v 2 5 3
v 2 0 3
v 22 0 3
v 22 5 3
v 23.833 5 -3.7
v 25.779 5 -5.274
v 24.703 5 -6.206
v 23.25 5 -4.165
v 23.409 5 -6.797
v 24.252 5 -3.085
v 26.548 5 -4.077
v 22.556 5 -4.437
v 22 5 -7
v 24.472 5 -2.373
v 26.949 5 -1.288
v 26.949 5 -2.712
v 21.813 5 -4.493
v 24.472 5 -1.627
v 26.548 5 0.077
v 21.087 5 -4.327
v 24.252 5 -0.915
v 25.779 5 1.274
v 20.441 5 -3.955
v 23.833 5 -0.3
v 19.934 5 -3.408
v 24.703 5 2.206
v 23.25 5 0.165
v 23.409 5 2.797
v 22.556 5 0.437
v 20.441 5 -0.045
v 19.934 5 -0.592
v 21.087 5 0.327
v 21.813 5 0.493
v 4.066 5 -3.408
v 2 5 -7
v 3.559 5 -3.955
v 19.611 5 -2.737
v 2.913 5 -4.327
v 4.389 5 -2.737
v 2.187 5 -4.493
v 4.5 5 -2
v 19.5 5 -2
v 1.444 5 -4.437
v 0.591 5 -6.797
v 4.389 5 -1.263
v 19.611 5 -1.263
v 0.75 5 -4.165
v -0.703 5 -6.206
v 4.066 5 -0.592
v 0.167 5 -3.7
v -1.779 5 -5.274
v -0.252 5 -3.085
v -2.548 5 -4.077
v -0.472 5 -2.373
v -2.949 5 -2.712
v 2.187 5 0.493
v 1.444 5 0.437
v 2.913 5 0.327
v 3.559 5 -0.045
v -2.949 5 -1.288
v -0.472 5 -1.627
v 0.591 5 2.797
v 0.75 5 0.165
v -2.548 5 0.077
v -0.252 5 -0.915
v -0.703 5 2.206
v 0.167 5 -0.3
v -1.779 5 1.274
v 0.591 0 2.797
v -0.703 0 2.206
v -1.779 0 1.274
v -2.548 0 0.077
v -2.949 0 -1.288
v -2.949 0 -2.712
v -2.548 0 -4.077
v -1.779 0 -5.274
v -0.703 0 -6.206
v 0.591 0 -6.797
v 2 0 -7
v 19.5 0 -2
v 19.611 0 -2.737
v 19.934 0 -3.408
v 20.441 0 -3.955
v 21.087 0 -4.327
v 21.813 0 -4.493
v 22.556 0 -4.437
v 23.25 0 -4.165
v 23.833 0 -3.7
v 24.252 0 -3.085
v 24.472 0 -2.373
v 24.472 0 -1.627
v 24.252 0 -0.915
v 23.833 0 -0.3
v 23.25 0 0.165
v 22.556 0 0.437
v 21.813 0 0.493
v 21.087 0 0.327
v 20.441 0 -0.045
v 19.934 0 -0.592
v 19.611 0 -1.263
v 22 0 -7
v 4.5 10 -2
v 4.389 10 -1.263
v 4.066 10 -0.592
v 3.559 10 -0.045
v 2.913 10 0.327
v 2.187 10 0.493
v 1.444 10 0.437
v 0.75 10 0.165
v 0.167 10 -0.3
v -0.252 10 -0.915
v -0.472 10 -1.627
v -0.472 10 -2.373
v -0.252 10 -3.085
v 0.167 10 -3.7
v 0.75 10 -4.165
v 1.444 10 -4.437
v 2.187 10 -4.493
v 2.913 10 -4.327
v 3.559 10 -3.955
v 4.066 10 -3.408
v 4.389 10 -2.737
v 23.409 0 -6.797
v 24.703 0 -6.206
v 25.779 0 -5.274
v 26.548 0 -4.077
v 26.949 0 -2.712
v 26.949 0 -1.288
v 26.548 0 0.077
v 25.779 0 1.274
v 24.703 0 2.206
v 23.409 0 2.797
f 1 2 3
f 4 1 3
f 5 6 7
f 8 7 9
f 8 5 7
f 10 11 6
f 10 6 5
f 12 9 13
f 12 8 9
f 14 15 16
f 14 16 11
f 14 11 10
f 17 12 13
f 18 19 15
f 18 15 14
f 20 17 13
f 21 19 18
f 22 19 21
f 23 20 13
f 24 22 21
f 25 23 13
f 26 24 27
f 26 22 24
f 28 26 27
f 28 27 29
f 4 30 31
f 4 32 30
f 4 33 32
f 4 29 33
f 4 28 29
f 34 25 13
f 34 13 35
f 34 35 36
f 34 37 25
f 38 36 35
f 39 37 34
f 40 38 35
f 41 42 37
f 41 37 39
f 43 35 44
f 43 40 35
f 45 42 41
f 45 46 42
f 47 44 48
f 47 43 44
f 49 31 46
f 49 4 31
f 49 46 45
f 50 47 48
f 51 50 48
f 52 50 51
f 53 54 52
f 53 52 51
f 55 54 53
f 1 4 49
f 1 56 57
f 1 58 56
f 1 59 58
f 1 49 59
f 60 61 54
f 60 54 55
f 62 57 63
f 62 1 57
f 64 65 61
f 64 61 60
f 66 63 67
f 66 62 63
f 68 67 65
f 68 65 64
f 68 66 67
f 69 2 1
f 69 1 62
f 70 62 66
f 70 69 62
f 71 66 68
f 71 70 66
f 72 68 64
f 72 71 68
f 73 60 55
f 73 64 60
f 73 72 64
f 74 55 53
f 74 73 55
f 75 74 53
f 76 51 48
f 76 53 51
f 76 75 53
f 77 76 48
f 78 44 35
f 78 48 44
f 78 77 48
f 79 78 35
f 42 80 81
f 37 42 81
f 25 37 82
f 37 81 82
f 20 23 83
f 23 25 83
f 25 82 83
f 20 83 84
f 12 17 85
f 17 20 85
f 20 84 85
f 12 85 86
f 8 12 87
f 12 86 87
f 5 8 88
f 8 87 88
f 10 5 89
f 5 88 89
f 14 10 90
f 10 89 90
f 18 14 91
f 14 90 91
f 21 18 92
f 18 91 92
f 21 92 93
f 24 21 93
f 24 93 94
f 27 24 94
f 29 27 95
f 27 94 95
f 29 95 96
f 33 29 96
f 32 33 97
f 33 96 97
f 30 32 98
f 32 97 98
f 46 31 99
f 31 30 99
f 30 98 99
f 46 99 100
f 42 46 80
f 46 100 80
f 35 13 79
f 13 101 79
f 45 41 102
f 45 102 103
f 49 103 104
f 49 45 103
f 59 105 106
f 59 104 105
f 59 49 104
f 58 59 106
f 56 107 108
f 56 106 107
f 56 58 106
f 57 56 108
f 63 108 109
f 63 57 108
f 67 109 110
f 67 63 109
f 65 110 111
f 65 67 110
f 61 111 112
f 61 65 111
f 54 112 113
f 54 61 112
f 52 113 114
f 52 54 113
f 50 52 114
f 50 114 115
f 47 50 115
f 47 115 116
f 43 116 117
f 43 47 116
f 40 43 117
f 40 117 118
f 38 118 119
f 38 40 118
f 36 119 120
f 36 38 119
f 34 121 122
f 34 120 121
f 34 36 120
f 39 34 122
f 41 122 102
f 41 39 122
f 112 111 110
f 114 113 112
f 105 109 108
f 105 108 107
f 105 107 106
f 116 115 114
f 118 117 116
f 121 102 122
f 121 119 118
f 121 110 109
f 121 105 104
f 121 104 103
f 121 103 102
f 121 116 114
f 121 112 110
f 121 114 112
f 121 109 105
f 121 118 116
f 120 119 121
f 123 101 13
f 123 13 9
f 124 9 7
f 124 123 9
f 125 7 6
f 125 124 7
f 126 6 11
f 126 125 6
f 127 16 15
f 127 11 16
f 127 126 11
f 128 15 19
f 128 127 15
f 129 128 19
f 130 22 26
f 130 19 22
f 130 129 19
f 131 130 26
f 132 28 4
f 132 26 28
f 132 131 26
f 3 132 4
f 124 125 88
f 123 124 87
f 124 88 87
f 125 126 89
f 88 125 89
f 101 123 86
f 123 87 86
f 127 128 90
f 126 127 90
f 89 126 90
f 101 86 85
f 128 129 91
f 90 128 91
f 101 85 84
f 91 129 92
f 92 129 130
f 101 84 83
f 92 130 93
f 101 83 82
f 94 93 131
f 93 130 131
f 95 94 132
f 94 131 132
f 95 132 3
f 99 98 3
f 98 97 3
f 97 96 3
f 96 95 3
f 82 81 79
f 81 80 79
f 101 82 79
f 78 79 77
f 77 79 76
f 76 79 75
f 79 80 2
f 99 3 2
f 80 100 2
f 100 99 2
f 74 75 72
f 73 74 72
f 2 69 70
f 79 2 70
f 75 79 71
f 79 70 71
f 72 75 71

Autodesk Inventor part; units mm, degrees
ref_plane "YZ Plane" through (0, 0, 0) normal (1, 0, 0) x (0, 1, 0)
ref_plane "XZ Plane" through (0, 0, 0) normal (0, 1, 0) x (-1, 0, 0)
ref_plane "XY Plane" through (0, 0, 0) normal (0, 0, 1) x (1, 0, 0)
sketch "Sketch1" plane through (0, 0, 0) normal (0, 1, 0) x (-1, 0, 0)
  line L0 (-2, -2) -> (-22, -2) construction
  line L1 (-2, 3) -> (-22, 3)
  line L2 (-22, -7) -> (-2, -7)
  arc A0 (-2, -7) -> (-2, 3) centre (-2, -2) ccw
  arc A1 (-22, 3) -> (-22, -7) centre (-22, -2) ccw
  circle A2 centre (-2, -2) radius 2.5
  circle A3 centre (-22, -2) radius 2.5
  point P0 (0, 0)
  point P1 (-12, -2)
  dimension "d0" = 20
  dimension "d1" = 10
  dimension "d2" = 5
extrude "Extrusion1" add sketch "Sketch1" along normal blind 5 contours A0 L2 A1 L1 | A2
sketch "Sketch2" plane through (0, 5, 0) normal (0, 1, 0) x (1, 0, 0)
  circle A0 centre (2, 2) radius 2.5 projected
  point P0 (0, 0)
extrude "Extrusion3" add sketch "Sketch2" along normal blind 5
